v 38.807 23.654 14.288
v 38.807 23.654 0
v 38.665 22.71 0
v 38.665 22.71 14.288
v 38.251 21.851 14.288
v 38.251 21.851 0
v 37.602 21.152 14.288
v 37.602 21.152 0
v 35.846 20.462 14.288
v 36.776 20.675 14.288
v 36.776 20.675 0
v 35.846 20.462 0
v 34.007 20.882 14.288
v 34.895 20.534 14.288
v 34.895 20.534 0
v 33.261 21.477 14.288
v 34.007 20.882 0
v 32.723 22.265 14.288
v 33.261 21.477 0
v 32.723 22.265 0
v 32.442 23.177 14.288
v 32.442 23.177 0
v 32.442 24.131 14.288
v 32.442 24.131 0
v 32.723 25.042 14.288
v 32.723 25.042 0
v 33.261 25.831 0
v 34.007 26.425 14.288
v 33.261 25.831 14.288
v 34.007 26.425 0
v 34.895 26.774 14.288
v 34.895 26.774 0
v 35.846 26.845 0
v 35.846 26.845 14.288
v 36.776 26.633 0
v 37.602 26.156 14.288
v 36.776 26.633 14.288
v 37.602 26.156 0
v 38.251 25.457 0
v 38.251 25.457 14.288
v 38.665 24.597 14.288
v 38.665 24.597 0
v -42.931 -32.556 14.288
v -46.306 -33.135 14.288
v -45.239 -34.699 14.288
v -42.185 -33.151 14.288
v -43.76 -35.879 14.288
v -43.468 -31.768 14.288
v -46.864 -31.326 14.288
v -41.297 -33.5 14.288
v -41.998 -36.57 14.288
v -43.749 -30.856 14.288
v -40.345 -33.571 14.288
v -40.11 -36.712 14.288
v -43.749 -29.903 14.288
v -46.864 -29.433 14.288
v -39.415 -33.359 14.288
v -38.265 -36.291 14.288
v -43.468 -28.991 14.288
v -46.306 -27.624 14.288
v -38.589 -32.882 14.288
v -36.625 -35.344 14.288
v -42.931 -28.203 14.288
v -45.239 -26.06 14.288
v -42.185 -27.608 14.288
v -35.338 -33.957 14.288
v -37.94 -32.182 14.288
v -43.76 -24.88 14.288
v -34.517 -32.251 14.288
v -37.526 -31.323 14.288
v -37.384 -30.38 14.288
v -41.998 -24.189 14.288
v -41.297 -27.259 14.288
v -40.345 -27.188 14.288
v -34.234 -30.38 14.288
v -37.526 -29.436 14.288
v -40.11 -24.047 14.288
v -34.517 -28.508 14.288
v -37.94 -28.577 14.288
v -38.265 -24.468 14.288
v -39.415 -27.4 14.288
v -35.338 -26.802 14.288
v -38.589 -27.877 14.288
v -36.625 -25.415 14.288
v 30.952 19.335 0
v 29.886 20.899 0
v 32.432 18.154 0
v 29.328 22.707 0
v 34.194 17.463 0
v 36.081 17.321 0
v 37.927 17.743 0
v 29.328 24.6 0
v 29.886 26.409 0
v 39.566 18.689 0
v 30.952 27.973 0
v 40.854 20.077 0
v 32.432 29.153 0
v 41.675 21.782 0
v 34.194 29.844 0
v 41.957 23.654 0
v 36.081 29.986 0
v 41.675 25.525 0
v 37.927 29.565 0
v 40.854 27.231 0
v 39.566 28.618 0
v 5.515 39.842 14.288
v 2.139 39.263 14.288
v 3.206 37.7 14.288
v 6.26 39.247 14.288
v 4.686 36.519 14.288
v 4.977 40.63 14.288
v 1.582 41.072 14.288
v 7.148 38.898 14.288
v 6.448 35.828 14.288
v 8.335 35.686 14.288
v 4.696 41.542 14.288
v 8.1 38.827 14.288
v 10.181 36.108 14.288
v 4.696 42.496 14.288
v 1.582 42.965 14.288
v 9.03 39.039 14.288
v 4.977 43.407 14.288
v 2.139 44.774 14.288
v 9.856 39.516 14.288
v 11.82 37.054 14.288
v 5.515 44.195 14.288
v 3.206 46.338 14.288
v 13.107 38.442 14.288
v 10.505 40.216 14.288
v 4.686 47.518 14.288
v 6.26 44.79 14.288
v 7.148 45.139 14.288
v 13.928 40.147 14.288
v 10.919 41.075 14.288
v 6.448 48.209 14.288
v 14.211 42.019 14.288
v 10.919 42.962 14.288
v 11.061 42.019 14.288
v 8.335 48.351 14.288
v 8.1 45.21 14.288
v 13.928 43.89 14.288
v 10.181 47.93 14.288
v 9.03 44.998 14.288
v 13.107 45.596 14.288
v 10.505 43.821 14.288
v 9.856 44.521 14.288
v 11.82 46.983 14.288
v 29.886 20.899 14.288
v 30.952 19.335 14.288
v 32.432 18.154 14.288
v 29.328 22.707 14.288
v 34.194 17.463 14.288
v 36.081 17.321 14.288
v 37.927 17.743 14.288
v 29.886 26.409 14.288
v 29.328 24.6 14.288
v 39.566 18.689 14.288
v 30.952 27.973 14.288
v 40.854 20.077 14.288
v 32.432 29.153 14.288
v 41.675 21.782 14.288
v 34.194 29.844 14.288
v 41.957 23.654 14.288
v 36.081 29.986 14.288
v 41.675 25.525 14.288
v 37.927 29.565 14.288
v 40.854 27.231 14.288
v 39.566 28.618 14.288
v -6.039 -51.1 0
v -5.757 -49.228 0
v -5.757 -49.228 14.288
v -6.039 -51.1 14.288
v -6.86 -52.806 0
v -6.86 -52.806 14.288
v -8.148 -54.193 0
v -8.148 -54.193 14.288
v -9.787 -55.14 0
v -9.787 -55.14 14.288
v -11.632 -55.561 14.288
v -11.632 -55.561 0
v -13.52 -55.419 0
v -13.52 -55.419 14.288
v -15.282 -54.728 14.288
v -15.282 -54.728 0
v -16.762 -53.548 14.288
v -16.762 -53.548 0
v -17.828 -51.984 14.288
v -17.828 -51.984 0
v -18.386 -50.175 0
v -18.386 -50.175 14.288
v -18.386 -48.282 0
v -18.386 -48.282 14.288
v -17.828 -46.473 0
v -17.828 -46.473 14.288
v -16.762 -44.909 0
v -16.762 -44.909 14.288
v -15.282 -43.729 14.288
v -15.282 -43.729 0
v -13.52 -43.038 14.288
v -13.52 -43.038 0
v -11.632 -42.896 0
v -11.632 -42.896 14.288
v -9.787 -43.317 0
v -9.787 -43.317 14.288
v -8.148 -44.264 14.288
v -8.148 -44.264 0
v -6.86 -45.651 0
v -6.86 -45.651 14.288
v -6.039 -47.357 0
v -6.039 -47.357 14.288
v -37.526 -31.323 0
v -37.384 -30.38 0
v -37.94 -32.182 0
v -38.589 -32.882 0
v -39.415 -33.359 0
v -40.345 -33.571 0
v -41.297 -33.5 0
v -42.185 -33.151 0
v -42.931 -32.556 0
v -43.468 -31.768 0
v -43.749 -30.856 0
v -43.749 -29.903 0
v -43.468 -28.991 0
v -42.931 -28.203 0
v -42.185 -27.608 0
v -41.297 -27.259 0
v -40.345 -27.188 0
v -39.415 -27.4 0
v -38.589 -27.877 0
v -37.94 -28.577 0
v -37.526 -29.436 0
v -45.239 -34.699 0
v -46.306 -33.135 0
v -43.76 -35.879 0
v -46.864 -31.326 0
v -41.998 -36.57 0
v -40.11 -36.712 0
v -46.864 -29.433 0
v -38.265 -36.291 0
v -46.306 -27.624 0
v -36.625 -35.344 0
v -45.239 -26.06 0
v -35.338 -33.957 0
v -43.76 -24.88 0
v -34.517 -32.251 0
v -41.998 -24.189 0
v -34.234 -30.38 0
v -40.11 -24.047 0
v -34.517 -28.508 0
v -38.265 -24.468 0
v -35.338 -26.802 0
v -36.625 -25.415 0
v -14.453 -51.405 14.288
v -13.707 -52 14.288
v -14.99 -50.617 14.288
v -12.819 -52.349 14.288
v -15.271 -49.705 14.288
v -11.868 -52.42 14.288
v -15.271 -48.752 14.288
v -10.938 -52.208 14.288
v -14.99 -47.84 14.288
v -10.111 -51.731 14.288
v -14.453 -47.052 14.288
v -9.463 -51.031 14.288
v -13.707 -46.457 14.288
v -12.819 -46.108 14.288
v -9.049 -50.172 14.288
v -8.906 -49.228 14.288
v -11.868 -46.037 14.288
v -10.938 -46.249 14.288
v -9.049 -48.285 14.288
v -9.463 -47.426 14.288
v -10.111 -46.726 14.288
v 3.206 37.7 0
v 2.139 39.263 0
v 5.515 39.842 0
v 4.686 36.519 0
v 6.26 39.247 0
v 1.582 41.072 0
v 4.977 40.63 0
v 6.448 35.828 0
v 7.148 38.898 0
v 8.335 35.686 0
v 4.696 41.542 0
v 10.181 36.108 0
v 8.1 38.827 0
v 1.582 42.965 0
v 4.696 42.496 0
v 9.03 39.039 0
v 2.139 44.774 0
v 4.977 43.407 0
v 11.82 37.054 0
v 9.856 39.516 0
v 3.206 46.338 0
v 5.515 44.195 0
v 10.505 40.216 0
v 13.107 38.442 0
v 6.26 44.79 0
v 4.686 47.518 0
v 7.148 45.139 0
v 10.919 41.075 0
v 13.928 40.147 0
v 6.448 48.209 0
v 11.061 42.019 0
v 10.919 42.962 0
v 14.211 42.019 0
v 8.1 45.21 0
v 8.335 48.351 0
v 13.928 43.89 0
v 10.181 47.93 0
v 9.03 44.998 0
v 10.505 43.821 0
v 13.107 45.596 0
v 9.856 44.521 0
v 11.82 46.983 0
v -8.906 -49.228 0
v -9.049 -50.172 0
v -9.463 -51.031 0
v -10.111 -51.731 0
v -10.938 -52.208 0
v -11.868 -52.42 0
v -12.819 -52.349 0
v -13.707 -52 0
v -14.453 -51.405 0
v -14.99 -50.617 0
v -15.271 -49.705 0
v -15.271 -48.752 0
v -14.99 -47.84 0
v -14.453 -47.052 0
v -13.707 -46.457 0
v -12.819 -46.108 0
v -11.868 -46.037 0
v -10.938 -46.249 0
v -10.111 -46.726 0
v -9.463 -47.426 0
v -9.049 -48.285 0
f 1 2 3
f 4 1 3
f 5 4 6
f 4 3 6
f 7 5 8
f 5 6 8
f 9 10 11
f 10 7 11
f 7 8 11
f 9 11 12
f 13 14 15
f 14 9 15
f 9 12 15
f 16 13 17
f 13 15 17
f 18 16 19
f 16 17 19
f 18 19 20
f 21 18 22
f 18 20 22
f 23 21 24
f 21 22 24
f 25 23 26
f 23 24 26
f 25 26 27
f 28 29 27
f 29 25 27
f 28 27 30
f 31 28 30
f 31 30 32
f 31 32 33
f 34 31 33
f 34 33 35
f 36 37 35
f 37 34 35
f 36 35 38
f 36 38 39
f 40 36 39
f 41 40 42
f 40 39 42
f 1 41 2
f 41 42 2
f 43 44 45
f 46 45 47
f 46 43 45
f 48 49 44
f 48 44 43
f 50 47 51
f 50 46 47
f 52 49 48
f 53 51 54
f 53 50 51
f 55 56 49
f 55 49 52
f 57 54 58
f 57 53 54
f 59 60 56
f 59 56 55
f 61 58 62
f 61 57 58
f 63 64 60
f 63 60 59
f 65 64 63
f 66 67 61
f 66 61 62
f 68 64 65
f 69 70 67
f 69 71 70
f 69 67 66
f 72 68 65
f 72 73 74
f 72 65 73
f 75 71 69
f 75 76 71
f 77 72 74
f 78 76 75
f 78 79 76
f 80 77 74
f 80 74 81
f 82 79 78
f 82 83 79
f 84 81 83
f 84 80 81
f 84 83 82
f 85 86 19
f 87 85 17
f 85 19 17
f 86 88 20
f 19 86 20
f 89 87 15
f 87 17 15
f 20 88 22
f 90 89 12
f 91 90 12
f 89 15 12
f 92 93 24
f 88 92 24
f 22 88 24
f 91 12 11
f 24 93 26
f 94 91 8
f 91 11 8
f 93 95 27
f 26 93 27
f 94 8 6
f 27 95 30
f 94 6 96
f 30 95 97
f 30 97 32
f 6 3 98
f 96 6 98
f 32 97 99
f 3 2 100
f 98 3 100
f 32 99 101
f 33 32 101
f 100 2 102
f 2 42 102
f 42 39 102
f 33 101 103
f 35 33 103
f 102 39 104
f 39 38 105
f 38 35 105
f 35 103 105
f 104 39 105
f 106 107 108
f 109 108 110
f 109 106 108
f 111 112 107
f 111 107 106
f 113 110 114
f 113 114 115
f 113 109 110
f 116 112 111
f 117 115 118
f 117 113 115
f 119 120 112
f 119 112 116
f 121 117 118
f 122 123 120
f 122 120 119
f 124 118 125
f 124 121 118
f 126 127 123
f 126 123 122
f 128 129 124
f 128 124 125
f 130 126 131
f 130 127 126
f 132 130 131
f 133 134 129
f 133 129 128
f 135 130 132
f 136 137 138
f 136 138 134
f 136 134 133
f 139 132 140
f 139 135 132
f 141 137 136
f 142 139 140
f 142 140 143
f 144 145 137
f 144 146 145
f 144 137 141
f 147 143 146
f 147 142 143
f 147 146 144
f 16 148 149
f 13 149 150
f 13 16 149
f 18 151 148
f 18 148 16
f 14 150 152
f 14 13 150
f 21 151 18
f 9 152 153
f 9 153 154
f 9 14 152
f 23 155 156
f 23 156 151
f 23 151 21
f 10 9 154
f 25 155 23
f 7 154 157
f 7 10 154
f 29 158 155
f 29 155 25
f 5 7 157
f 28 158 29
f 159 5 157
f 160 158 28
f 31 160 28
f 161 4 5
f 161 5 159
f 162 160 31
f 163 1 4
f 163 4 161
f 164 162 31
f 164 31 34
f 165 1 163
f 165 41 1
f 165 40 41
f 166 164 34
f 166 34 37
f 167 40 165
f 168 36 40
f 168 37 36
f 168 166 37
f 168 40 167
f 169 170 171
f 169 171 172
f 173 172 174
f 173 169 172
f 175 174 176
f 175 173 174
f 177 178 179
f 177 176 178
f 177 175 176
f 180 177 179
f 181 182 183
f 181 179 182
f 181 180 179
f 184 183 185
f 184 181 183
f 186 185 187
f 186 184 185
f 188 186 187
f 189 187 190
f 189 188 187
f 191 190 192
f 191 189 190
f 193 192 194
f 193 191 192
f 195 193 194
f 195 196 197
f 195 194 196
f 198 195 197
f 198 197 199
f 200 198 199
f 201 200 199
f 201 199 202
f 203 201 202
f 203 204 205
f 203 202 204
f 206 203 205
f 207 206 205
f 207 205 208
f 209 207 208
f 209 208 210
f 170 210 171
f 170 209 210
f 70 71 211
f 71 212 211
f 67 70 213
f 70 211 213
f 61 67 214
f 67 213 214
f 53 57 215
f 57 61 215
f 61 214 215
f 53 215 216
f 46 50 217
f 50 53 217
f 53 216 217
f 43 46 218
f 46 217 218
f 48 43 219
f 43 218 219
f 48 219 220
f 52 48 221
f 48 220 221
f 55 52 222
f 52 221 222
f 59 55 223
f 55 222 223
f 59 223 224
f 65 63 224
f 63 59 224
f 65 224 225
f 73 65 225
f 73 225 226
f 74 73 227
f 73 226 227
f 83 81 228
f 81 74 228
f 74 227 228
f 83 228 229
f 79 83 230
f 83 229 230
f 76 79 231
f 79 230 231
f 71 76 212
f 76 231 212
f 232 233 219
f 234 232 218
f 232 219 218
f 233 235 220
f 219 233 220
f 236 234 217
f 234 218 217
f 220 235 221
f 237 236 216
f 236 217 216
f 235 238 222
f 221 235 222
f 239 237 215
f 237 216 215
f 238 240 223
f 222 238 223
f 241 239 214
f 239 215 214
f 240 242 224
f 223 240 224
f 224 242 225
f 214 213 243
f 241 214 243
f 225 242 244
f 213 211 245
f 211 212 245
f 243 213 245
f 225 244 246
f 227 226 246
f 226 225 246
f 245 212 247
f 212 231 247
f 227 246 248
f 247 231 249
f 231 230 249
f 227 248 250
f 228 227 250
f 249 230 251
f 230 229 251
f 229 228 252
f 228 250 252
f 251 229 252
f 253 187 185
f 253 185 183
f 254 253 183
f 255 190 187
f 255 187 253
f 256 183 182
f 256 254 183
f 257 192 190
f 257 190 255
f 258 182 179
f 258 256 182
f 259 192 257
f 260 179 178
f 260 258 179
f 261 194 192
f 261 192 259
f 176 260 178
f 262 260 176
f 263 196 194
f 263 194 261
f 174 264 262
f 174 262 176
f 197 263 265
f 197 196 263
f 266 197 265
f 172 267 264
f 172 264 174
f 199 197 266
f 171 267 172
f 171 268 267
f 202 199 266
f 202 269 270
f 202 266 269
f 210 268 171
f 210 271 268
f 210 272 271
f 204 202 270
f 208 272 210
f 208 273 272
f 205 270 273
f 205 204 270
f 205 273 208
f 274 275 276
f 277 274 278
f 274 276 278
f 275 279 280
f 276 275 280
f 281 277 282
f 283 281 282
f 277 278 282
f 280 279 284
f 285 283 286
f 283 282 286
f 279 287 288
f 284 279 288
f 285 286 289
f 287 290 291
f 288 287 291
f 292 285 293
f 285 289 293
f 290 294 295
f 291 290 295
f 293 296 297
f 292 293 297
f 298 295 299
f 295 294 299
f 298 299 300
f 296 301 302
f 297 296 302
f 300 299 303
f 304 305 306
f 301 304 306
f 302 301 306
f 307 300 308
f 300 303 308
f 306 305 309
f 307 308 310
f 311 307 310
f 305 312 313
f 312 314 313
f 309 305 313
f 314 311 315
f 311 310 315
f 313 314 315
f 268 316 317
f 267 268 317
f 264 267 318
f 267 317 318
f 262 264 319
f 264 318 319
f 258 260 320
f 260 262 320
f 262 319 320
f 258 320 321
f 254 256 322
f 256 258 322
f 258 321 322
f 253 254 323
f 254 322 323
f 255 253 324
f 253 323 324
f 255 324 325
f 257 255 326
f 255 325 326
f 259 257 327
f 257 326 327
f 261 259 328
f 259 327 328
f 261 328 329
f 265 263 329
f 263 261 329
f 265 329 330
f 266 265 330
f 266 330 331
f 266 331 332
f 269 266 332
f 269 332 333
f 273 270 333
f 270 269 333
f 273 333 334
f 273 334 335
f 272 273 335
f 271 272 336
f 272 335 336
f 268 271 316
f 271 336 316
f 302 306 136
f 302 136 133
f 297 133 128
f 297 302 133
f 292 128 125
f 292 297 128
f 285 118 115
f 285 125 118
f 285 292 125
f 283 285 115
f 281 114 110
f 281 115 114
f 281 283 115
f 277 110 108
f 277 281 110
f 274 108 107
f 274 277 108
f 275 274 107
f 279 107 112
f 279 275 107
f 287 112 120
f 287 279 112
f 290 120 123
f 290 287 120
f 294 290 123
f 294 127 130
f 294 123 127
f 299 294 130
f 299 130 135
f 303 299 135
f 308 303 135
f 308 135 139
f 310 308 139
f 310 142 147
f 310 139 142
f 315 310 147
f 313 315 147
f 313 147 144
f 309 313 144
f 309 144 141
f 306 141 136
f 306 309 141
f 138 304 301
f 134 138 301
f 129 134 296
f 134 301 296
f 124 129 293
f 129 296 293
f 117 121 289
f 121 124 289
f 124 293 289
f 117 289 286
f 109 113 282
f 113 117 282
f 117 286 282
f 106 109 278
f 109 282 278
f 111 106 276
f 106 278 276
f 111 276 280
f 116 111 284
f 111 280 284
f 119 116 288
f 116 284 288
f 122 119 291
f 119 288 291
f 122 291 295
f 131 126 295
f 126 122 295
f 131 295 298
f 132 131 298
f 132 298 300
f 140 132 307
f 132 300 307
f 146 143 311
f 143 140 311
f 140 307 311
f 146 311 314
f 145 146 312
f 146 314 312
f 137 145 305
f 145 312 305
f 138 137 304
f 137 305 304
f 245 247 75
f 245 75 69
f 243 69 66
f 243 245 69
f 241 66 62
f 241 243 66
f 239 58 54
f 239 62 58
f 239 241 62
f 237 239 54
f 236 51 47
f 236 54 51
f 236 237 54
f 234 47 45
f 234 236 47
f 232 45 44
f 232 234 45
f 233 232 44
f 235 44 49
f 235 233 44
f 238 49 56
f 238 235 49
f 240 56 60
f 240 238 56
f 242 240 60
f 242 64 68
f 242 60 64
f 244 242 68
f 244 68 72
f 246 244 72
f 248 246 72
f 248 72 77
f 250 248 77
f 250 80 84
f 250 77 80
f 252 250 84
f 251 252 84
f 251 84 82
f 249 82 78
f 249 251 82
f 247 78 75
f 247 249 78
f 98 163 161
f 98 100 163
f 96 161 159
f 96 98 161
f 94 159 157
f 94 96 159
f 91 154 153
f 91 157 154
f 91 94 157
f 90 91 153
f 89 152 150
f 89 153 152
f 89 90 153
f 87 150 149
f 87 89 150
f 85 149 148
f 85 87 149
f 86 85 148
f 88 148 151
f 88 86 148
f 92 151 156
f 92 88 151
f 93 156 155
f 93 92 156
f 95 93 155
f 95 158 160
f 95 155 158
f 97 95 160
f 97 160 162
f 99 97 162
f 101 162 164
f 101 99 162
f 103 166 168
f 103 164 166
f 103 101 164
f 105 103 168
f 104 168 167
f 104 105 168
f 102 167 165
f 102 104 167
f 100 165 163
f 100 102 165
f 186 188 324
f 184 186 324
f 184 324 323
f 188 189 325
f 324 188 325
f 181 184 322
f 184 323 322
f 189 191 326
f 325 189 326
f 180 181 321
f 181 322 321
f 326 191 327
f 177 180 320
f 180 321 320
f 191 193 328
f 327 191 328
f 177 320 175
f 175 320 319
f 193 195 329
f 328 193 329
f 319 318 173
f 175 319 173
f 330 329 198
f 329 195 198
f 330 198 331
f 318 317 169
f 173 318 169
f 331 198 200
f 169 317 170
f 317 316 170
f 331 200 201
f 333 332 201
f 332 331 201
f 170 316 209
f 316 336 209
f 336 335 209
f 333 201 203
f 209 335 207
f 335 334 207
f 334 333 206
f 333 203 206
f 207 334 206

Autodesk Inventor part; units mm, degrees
ref_plane "YZ Plane" through (0, 0, 0) normal (1, 0, 0) x (0, 1, 0)
ref_plane "XZ Plane" through (0, 0, 0) normal (0, 1, 0) x (-1, 0, 0)
ref_plane "XY Plane" through (0, 0, 0) normal (0, 0, 1) x (1, 0, 0)
sketch "Sketch1" plane through (0, 0, 0) normal (0, 0, 1) x (1, 0, 0)
  circle A0 centre (-12.1068, -49.2285) radius 3.302 construction
  circle A1 centre (-40.5845, -30.3795) radius 3.302 construction
  circle A2 centre (7.8606, 42.0186) radius 3.302 construction
  circle A3 centre (35.6069, 23.6537) radius 3.302 construction
  circle A4 centre (-12.1068, -49.2285) radius 6.35
  circle A5 centre (-12.1068, -49.2285) radius 3.2004
  circle A6 centre (-40.5845, -30.3795) radius 3.2004
  circle A7 centre (-40.5845, -30.3795) radius 6.35
  circle A8 centre (35.6069, 23.6537) radius 3.2004
  circle A9 centre (35.6069, 23.6537) radius 6.35
  circle A10 centre (7.8606, 42.0186) radius 3.2004
  circle A11 centre (7.8606, 42.0186) radius 6.35
  point P0 (0, 0)
  dimension "d2" = 12.7
  dimension "d3" = 6.4008
  dimension "d4" = 6.4008
  dimension "d5" = 12.7
  dimension "d6" = 6.4008
  dimension "d7" = 12.7
  dimension "d8" = 6.4008
  dimension "d9" = 12.7
extrude "Extrusion1" add sketch "Sketch1" along normal blind 14.2875
properties part number "Spacer" material "Nylon 6/6"
